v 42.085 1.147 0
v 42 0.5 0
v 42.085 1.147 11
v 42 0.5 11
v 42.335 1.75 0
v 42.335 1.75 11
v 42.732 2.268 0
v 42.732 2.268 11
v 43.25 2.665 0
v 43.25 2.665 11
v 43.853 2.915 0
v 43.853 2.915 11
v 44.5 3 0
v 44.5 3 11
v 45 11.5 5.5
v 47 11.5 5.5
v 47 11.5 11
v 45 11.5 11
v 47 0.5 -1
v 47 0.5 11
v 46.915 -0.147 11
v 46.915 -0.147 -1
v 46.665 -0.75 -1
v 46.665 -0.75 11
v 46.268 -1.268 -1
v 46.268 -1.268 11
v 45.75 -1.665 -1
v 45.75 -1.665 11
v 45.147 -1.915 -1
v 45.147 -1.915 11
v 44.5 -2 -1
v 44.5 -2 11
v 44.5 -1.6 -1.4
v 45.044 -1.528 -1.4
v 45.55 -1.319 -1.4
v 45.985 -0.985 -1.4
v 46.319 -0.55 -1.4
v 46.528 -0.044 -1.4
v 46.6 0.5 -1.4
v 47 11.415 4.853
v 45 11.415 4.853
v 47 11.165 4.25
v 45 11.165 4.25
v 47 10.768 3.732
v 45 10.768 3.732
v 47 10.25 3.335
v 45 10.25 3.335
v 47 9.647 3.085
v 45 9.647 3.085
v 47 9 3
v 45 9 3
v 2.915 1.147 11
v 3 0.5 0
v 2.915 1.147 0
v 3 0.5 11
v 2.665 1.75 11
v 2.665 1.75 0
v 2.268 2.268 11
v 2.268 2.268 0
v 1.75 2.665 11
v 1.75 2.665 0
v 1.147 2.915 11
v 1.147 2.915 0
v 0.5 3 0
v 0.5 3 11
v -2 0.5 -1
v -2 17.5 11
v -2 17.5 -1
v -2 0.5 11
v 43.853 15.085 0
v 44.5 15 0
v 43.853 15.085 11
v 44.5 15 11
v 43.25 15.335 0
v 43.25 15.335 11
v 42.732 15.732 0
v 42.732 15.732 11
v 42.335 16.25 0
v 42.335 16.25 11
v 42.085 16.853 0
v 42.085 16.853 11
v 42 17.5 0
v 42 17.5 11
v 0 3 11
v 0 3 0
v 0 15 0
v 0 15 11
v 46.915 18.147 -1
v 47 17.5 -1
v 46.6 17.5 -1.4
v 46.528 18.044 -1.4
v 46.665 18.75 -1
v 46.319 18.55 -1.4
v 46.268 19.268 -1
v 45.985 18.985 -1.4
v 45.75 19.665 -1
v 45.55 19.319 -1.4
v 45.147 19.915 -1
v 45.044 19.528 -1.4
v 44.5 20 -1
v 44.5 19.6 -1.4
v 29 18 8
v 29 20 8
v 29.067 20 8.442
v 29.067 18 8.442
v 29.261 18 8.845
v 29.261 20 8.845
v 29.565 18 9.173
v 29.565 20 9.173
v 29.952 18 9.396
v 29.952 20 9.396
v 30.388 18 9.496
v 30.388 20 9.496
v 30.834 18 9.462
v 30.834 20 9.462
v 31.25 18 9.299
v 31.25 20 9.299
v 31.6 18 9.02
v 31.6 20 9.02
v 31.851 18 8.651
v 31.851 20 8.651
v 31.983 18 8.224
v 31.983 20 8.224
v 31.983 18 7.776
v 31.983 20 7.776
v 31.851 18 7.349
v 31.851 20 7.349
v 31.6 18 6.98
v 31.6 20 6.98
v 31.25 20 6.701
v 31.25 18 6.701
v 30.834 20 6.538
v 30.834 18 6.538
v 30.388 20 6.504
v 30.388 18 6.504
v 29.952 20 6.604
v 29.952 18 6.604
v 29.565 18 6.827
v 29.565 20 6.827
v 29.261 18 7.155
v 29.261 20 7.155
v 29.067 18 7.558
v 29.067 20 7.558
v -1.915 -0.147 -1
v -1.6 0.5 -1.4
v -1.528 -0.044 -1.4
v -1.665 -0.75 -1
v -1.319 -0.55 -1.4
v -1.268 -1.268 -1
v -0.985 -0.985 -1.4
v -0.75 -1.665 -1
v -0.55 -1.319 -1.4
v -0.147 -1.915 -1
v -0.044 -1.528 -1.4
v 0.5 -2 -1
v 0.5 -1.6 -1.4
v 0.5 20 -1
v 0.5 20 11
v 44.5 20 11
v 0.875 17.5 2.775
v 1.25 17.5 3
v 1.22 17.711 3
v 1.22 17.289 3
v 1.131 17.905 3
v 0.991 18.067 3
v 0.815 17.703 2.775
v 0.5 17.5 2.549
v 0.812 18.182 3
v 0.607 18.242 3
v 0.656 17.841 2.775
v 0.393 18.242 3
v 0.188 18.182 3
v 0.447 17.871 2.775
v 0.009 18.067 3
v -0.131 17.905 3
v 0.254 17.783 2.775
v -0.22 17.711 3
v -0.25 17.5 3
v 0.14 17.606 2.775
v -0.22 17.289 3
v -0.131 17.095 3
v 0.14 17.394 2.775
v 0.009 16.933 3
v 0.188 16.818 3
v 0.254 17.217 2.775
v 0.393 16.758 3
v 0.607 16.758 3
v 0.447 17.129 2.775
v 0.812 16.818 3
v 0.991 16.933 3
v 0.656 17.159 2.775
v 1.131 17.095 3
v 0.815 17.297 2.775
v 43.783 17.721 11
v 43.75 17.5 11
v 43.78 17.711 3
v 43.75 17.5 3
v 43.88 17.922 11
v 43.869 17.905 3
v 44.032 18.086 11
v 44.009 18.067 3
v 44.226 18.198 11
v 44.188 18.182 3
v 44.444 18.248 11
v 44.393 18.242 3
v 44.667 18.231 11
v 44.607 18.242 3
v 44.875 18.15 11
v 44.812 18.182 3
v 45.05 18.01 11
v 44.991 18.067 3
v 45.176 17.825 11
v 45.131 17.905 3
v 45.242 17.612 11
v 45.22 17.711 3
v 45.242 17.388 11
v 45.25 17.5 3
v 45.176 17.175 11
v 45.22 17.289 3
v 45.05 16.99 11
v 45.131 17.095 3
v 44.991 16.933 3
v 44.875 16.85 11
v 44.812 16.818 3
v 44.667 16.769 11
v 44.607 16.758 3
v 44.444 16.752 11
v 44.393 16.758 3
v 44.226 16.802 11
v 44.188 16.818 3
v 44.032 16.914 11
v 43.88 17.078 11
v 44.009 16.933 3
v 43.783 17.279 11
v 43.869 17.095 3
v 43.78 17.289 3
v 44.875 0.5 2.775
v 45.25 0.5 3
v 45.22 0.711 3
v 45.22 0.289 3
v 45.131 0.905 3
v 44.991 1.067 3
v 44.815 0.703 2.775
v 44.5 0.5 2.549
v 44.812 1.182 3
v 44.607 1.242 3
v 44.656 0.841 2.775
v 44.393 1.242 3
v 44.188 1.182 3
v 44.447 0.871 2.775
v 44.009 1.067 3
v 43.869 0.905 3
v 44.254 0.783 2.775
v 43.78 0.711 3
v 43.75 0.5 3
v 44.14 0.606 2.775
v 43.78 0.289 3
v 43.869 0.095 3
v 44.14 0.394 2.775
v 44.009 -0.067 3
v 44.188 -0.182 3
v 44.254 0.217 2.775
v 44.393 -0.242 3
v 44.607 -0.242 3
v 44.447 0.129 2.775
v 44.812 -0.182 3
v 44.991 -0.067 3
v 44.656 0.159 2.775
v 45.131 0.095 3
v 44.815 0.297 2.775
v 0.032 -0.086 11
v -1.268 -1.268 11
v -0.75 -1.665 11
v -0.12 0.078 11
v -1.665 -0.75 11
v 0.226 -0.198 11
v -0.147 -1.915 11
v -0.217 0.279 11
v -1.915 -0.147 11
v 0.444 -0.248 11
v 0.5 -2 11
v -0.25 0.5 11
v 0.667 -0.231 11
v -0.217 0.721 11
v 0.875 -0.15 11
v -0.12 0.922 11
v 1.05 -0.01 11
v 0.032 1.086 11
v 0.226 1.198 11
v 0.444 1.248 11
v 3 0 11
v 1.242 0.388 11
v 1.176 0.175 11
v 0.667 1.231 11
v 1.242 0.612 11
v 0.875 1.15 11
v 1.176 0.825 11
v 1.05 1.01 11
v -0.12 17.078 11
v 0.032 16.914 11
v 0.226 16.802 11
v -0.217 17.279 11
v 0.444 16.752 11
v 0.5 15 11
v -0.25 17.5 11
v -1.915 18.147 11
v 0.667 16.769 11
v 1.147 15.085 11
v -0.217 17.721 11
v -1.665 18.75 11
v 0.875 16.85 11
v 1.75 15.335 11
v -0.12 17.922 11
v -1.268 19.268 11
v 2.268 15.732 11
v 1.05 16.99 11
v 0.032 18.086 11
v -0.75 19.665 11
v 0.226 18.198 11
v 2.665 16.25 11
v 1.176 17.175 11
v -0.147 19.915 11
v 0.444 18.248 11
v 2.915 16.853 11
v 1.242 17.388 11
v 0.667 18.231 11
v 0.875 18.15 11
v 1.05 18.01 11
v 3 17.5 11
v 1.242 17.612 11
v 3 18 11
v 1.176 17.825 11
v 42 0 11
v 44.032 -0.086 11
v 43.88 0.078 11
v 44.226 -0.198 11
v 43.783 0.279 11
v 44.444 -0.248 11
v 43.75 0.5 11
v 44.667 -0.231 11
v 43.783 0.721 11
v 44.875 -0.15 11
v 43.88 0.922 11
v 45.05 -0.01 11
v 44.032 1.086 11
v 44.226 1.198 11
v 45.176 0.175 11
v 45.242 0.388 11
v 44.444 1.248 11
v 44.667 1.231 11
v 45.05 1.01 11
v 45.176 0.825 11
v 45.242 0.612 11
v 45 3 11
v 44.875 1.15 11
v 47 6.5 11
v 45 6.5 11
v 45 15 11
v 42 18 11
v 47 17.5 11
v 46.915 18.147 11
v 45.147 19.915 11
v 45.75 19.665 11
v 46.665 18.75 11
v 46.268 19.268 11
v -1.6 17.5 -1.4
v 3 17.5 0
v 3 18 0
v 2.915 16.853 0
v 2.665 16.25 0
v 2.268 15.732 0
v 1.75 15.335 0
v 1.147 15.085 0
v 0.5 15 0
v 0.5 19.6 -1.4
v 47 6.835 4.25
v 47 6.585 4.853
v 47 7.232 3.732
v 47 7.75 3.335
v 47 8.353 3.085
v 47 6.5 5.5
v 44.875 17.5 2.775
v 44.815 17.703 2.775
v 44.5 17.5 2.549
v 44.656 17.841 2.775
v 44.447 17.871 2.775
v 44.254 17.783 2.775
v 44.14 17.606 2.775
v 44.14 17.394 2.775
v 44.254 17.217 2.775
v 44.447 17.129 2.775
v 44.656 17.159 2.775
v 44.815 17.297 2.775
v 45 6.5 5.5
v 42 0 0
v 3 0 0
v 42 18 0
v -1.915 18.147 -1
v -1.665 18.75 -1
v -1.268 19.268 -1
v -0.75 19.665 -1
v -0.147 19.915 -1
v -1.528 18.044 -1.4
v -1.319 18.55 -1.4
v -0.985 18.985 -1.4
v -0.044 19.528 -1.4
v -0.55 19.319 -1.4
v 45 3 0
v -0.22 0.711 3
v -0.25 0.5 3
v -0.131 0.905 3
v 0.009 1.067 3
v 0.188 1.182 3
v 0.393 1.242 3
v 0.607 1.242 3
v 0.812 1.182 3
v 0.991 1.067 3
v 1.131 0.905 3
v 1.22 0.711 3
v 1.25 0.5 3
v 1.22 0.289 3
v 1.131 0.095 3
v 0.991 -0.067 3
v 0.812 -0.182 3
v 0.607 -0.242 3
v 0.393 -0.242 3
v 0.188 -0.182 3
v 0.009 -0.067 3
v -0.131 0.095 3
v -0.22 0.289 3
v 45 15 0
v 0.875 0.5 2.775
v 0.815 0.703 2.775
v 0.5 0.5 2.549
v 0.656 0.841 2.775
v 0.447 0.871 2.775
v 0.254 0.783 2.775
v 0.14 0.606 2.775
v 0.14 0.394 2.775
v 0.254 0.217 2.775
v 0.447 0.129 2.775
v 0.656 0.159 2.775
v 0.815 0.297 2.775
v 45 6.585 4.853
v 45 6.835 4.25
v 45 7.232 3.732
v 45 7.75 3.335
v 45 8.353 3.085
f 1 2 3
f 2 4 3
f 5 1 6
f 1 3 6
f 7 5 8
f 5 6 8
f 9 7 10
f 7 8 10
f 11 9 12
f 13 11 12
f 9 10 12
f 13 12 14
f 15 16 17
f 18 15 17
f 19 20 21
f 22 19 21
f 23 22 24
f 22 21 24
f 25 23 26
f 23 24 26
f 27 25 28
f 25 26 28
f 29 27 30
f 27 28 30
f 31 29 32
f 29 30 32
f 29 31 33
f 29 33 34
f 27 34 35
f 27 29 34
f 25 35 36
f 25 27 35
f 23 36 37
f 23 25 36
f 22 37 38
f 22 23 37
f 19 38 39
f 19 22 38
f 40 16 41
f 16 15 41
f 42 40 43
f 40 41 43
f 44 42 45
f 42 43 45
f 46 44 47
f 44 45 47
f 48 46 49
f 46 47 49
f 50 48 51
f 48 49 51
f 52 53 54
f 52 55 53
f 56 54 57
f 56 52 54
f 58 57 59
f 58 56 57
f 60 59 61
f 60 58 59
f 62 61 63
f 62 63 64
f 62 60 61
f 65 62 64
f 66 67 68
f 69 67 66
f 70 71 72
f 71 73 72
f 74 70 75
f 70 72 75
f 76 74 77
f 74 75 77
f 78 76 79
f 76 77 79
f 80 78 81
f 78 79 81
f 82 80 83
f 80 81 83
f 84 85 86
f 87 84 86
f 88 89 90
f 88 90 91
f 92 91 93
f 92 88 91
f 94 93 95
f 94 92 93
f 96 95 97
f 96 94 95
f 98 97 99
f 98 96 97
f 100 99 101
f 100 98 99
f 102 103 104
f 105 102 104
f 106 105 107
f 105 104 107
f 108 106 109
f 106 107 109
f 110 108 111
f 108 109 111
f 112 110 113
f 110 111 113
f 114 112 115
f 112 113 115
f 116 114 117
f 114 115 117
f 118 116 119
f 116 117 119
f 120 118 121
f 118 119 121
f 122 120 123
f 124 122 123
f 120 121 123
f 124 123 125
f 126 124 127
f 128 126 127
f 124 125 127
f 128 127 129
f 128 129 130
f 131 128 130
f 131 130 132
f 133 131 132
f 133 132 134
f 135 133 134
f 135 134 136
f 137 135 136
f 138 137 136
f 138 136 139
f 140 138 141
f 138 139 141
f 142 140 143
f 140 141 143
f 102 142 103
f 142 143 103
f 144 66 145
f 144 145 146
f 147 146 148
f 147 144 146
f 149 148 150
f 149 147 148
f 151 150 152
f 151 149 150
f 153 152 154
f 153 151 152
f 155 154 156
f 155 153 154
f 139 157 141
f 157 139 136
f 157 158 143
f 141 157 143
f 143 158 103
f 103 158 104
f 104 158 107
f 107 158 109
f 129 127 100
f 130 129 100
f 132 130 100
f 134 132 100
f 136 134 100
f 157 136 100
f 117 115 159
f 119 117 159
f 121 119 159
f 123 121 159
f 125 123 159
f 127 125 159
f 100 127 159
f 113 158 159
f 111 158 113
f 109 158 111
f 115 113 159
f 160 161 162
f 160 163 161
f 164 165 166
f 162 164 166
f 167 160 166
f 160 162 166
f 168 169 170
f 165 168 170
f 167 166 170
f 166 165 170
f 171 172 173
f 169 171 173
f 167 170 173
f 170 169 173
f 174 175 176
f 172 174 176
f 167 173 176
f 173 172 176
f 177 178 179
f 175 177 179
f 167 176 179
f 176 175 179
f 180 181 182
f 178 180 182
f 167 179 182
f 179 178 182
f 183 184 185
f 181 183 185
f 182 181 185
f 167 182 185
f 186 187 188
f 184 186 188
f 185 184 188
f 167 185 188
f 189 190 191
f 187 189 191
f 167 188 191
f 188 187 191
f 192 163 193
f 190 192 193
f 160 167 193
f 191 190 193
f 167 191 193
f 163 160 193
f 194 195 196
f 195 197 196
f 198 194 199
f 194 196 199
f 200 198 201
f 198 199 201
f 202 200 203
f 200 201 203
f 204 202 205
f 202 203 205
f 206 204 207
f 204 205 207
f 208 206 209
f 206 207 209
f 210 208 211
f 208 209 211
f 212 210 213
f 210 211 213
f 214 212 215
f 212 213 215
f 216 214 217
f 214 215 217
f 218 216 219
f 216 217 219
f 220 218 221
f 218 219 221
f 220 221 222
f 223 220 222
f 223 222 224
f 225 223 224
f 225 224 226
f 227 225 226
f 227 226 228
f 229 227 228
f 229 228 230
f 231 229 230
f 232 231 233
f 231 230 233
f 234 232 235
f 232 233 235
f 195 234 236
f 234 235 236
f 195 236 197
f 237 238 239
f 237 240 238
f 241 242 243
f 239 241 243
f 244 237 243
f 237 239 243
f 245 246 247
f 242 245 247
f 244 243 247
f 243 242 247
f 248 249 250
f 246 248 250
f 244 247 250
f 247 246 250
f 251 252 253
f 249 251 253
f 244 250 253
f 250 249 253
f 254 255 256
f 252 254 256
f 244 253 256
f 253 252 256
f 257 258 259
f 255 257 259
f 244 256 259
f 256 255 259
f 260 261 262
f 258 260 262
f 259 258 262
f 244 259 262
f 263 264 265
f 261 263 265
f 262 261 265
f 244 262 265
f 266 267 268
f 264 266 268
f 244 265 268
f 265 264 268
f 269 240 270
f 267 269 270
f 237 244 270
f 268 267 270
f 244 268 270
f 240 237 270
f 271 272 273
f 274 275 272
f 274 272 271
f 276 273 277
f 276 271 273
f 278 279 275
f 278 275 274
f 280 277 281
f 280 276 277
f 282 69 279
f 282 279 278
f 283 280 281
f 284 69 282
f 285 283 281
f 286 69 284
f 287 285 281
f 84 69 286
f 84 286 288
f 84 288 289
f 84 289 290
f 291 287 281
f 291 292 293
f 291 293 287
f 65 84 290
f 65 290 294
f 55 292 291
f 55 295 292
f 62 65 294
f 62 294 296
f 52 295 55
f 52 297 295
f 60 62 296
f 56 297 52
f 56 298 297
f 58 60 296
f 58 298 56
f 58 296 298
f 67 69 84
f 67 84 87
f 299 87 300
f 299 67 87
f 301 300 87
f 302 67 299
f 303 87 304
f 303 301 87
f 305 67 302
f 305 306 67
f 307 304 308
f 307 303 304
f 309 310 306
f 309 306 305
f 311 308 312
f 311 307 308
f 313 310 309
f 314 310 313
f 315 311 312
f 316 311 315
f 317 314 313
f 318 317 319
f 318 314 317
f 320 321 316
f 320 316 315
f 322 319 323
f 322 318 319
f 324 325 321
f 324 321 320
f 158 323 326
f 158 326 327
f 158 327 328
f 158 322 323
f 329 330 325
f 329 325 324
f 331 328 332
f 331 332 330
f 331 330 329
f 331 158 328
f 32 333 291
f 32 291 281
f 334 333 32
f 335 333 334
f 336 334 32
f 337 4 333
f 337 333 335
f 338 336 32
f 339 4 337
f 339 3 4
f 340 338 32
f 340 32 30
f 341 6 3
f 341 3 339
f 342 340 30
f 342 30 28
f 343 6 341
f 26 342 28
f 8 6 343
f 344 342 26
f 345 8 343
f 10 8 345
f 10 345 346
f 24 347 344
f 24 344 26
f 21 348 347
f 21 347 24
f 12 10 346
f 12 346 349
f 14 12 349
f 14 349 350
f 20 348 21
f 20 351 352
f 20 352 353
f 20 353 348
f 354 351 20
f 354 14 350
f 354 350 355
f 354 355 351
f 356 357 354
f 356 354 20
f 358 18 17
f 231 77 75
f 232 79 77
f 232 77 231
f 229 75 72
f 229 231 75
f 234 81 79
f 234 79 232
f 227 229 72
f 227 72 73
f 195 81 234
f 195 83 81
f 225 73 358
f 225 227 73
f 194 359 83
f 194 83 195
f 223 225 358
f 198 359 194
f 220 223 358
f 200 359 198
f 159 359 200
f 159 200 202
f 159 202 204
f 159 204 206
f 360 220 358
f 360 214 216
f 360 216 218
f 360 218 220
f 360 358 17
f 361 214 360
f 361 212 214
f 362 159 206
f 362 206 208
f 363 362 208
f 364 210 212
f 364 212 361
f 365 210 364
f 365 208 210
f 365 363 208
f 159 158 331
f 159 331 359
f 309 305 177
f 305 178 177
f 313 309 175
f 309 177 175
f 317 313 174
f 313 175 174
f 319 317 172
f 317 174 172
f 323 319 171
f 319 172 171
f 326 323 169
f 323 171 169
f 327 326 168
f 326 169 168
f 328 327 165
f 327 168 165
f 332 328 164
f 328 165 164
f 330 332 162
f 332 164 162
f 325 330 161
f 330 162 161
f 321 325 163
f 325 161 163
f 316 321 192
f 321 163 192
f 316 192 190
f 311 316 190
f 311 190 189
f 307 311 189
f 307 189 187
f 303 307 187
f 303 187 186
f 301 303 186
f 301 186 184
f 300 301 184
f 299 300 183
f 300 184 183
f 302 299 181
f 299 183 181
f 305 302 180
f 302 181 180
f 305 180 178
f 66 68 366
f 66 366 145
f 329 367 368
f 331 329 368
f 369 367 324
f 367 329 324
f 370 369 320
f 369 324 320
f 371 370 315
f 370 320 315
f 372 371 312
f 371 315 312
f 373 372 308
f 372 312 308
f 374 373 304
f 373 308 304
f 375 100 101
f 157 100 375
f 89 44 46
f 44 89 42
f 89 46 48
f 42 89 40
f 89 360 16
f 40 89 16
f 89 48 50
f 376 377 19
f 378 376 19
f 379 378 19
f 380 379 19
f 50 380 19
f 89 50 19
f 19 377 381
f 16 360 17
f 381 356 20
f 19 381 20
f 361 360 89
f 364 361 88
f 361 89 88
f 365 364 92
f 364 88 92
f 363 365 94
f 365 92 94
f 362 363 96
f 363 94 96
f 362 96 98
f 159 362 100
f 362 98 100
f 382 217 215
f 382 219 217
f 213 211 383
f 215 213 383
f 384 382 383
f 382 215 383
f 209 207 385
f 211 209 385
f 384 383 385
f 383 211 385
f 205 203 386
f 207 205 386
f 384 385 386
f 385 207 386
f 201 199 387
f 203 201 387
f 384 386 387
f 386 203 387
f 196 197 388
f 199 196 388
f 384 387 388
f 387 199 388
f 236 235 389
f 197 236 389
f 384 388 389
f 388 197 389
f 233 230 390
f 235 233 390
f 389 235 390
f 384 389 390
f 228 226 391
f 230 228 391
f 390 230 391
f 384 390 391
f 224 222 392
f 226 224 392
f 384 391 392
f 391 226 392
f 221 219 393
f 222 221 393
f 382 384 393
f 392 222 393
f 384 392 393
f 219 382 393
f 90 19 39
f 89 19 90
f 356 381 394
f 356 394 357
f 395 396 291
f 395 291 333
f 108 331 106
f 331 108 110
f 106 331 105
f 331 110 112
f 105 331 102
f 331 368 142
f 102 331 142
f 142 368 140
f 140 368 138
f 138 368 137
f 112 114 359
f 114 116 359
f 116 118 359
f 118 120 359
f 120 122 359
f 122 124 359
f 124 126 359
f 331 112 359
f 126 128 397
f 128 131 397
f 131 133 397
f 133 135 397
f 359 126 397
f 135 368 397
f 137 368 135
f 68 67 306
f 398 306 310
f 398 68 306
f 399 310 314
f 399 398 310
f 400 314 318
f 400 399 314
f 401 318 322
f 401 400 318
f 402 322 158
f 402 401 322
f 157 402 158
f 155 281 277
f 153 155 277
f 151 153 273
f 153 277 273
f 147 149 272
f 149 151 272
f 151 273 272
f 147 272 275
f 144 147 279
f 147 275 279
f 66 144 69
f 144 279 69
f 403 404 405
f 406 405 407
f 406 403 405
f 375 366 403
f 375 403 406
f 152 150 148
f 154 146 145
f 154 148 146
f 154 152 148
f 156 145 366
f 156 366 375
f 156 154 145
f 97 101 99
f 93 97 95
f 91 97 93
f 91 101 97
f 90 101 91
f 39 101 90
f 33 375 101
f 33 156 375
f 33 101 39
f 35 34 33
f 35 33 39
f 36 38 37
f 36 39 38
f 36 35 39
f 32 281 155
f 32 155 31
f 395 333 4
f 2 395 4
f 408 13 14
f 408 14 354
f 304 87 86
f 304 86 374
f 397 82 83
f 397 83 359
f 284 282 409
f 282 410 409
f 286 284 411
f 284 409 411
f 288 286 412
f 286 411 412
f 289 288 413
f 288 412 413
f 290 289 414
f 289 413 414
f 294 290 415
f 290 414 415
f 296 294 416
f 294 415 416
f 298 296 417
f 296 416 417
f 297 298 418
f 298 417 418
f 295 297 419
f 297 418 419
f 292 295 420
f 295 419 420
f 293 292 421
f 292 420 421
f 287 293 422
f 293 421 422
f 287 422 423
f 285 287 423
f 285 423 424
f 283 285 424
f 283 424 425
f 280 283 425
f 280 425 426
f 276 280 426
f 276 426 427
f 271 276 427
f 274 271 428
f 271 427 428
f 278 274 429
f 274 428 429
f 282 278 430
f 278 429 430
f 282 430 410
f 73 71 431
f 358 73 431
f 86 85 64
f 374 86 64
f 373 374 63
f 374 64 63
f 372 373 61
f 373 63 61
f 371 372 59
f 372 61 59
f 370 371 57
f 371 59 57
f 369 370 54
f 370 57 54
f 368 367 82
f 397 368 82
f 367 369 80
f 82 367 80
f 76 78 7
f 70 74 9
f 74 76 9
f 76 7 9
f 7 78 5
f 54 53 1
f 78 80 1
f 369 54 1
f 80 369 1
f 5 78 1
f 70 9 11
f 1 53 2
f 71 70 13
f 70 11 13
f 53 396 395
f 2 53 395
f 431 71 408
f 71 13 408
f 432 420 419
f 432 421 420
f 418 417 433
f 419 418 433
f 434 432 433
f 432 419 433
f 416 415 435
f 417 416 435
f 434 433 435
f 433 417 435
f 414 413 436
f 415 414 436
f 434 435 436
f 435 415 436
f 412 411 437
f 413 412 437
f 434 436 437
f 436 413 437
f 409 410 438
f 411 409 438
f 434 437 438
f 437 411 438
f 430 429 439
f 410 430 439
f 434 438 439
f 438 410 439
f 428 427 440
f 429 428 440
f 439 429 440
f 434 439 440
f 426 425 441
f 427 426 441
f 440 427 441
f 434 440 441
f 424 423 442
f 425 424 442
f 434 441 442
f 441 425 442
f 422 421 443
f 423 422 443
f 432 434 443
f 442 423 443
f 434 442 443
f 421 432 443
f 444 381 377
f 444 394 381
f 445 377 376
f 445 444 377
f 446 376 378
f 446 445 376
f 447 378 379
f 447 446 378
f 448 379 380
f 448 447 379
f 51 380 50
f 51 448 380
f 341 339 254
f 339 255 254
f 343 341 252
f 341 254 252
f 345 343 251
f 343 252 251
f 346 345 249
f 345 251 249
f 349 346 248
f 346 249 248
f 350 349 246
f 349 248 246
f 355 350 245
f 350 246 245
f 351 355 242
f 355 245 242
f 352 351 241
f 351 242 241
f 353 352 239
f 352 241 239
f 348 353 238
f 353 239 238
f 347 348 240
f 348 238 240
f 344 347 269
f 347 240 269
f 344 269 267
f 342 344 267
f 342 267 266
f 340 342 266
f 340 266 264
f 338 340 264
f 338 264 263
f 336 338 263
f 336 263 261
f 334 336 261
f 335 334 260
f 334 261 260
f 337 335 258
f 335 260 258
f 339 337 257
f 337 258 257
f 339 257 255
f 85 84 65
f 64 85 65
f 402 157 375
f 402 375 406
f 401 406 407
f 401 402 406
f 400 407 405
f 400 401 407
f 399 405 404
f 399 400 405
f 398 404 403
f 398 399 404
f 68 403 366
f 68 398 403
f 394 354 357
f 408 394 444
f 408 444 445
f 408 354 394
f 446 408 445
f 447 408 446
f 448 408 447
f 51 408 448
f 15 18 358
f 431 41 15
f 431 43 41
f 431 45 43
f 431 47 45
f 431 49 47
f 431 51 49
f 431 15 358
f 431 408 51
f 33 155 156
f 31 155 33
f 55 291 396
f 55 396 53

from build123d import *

# Parameters (mm, degrees)
F0_W      = 49
F0_H      = 22
F0_W_2    = 45
F0_H_2    = 18
F1_DEPTH  = 11
F2_W      = 49
F2_H      = 22
F3_DEPTH  = 1.4
F4_W      = 5
F4_H      = 8
F5_DEPTH  = 2
F6_R      = 1.5
F7_DEPTH  = 2
F8_W      = 3
F8_H      = 3
F9_DEPTH  = 11
F10_R     = 2.5
F11_R     = 2.5
F12_R     = 2.49999
F14_D     = 1.5
F14_DEPTH = 8
F14_TIP   = 0.4506454643
F15_SIZE  = 0.4


# Not quite as in the source:
# - a fillet or chamfer is up to 0.001 mm smaller than in the source, because OpenCascade refuses the exact size


with BuildPart() as f1:
    # F0 (on Top) → F1 (new body)
    with BuildSketch(Plane.XY):
        with Locations((22.5, 9)):
            Rectangle(F0_W, F0_H)
        with Locations((22.5, 9)):
            Rectangle(F0_W_2, F0_H_2, mode=Mode.SUBTRACT)
    extrude(amount=F1_DEPTH)

    # F2 (on face) → F3 (join)
    with BuildSketch(Plane(origin=(0, 0, 0), x_dir=(1, 0, 0), z_dir=(0, 0, -1))):
        with Locations((22.5, -9)):
            Rectangle(F2_W, F2_H)
    extrude(amount=F3_DEPTH)

    # F4 (on face) → F5 (cut, through all)
    with BuildSketch(Plane.YZ.offset(47)):
        with Locations((9, 7)):
            Rectangle(F4_W, F4_H)
    extrude(amount=-F5_DEPTH, mode=Mode.SUBTRACT)

    # F6 (on face) → F7 (cut, through all)
    with BuildSketch(Plane(origin=(0, 20, 0), x_dir=(-1, 0, 0), z_dir=(0, 1, 0))):
        with Locations((-30.5, 8)):
            Circle(F6_R)
    extrude(amount=-F7_DEPTH, mode=Mode.SUBTRACT)

    # F8 (on face) → F9 (join, through all)
    with BuildSketch(Plane.XY):
        with Locations((1.5, 1.5)):
            Rectangle(F8_W, F8_H)
        with Locations((43.5, 1.5)):
            Rectangle(F8_W, F8_H)
        with Locations((1.5, 16.5)):
            Rectangle(F8_W, F8_H)
        with Locations((43.5, 16.5)):
            Rectangle(F8_W, F8_H)
    extrude(amount=F9_DEPTH)

    # F10
    f10_edges = [f1.edges().sort_by_distance(p)[0] for p in [
        (42, 3, 5.5),
        (42, 15, 5.5),
        (3, 3, 5.5),
        (3, 15, 5.5),
    ]]
    fillet(f10_edges, radius=F10_R)

    # F11
    f11_edges = [f1.edges().sort_by_distance(p)[0] for p in [
        (47, -2, 4.8),
        (47, 20, 4.8),
        (-2, 20, 4.8),
        (-2, -2, 4.8),
    ]]
    fillet(f11_edges, radius=F11_R)

    # F12 (radius 2.5 in the source; OpenCascade refuses exactly that, so slightly less here)
    f12_edges = [f1.edges().sort_by_distance(p)[0] for p in [
        (46, 11.5, 3),
        (46, 6.5, 3),
    ]]
    fillet(f12_edges, radius=F12_R)

    # F14
    with Locations(Plane.XY.offset(11)):
        with Locations((44.5, 17.5), (44.5, 0.5), (0.5, 0.5), (0.5, 17.5)):
            Hole(F14_D / 2, depth=F14_DEPTH)
            with Locations((0, 0, -(F14_DEPTH + F14_TIP / 2))):  # 118° drill point
                Cone(0, F14_D / 2, F14_TIP, mode=Mode.SUBTRACT)

    # F15
    f15_edges = [f1.edges().sort_by_distance(p)[0] for p in [
        (-2, 9, -1.4),
        (-1.267767, -1.267767, -1.4),
        (-1.267767, 19.267767, -1.4),
        (22.5, -2, -1.4),
        (22.5, 20, -1.4),
        (46.267767, -1.267767, -1.4),
        (46.267767, 19.267767, -1.4),
        (47, 9, -1.4),
    ]]
    chamfer(f15_edges, length=F15_SIZE)


solid = f1.part
